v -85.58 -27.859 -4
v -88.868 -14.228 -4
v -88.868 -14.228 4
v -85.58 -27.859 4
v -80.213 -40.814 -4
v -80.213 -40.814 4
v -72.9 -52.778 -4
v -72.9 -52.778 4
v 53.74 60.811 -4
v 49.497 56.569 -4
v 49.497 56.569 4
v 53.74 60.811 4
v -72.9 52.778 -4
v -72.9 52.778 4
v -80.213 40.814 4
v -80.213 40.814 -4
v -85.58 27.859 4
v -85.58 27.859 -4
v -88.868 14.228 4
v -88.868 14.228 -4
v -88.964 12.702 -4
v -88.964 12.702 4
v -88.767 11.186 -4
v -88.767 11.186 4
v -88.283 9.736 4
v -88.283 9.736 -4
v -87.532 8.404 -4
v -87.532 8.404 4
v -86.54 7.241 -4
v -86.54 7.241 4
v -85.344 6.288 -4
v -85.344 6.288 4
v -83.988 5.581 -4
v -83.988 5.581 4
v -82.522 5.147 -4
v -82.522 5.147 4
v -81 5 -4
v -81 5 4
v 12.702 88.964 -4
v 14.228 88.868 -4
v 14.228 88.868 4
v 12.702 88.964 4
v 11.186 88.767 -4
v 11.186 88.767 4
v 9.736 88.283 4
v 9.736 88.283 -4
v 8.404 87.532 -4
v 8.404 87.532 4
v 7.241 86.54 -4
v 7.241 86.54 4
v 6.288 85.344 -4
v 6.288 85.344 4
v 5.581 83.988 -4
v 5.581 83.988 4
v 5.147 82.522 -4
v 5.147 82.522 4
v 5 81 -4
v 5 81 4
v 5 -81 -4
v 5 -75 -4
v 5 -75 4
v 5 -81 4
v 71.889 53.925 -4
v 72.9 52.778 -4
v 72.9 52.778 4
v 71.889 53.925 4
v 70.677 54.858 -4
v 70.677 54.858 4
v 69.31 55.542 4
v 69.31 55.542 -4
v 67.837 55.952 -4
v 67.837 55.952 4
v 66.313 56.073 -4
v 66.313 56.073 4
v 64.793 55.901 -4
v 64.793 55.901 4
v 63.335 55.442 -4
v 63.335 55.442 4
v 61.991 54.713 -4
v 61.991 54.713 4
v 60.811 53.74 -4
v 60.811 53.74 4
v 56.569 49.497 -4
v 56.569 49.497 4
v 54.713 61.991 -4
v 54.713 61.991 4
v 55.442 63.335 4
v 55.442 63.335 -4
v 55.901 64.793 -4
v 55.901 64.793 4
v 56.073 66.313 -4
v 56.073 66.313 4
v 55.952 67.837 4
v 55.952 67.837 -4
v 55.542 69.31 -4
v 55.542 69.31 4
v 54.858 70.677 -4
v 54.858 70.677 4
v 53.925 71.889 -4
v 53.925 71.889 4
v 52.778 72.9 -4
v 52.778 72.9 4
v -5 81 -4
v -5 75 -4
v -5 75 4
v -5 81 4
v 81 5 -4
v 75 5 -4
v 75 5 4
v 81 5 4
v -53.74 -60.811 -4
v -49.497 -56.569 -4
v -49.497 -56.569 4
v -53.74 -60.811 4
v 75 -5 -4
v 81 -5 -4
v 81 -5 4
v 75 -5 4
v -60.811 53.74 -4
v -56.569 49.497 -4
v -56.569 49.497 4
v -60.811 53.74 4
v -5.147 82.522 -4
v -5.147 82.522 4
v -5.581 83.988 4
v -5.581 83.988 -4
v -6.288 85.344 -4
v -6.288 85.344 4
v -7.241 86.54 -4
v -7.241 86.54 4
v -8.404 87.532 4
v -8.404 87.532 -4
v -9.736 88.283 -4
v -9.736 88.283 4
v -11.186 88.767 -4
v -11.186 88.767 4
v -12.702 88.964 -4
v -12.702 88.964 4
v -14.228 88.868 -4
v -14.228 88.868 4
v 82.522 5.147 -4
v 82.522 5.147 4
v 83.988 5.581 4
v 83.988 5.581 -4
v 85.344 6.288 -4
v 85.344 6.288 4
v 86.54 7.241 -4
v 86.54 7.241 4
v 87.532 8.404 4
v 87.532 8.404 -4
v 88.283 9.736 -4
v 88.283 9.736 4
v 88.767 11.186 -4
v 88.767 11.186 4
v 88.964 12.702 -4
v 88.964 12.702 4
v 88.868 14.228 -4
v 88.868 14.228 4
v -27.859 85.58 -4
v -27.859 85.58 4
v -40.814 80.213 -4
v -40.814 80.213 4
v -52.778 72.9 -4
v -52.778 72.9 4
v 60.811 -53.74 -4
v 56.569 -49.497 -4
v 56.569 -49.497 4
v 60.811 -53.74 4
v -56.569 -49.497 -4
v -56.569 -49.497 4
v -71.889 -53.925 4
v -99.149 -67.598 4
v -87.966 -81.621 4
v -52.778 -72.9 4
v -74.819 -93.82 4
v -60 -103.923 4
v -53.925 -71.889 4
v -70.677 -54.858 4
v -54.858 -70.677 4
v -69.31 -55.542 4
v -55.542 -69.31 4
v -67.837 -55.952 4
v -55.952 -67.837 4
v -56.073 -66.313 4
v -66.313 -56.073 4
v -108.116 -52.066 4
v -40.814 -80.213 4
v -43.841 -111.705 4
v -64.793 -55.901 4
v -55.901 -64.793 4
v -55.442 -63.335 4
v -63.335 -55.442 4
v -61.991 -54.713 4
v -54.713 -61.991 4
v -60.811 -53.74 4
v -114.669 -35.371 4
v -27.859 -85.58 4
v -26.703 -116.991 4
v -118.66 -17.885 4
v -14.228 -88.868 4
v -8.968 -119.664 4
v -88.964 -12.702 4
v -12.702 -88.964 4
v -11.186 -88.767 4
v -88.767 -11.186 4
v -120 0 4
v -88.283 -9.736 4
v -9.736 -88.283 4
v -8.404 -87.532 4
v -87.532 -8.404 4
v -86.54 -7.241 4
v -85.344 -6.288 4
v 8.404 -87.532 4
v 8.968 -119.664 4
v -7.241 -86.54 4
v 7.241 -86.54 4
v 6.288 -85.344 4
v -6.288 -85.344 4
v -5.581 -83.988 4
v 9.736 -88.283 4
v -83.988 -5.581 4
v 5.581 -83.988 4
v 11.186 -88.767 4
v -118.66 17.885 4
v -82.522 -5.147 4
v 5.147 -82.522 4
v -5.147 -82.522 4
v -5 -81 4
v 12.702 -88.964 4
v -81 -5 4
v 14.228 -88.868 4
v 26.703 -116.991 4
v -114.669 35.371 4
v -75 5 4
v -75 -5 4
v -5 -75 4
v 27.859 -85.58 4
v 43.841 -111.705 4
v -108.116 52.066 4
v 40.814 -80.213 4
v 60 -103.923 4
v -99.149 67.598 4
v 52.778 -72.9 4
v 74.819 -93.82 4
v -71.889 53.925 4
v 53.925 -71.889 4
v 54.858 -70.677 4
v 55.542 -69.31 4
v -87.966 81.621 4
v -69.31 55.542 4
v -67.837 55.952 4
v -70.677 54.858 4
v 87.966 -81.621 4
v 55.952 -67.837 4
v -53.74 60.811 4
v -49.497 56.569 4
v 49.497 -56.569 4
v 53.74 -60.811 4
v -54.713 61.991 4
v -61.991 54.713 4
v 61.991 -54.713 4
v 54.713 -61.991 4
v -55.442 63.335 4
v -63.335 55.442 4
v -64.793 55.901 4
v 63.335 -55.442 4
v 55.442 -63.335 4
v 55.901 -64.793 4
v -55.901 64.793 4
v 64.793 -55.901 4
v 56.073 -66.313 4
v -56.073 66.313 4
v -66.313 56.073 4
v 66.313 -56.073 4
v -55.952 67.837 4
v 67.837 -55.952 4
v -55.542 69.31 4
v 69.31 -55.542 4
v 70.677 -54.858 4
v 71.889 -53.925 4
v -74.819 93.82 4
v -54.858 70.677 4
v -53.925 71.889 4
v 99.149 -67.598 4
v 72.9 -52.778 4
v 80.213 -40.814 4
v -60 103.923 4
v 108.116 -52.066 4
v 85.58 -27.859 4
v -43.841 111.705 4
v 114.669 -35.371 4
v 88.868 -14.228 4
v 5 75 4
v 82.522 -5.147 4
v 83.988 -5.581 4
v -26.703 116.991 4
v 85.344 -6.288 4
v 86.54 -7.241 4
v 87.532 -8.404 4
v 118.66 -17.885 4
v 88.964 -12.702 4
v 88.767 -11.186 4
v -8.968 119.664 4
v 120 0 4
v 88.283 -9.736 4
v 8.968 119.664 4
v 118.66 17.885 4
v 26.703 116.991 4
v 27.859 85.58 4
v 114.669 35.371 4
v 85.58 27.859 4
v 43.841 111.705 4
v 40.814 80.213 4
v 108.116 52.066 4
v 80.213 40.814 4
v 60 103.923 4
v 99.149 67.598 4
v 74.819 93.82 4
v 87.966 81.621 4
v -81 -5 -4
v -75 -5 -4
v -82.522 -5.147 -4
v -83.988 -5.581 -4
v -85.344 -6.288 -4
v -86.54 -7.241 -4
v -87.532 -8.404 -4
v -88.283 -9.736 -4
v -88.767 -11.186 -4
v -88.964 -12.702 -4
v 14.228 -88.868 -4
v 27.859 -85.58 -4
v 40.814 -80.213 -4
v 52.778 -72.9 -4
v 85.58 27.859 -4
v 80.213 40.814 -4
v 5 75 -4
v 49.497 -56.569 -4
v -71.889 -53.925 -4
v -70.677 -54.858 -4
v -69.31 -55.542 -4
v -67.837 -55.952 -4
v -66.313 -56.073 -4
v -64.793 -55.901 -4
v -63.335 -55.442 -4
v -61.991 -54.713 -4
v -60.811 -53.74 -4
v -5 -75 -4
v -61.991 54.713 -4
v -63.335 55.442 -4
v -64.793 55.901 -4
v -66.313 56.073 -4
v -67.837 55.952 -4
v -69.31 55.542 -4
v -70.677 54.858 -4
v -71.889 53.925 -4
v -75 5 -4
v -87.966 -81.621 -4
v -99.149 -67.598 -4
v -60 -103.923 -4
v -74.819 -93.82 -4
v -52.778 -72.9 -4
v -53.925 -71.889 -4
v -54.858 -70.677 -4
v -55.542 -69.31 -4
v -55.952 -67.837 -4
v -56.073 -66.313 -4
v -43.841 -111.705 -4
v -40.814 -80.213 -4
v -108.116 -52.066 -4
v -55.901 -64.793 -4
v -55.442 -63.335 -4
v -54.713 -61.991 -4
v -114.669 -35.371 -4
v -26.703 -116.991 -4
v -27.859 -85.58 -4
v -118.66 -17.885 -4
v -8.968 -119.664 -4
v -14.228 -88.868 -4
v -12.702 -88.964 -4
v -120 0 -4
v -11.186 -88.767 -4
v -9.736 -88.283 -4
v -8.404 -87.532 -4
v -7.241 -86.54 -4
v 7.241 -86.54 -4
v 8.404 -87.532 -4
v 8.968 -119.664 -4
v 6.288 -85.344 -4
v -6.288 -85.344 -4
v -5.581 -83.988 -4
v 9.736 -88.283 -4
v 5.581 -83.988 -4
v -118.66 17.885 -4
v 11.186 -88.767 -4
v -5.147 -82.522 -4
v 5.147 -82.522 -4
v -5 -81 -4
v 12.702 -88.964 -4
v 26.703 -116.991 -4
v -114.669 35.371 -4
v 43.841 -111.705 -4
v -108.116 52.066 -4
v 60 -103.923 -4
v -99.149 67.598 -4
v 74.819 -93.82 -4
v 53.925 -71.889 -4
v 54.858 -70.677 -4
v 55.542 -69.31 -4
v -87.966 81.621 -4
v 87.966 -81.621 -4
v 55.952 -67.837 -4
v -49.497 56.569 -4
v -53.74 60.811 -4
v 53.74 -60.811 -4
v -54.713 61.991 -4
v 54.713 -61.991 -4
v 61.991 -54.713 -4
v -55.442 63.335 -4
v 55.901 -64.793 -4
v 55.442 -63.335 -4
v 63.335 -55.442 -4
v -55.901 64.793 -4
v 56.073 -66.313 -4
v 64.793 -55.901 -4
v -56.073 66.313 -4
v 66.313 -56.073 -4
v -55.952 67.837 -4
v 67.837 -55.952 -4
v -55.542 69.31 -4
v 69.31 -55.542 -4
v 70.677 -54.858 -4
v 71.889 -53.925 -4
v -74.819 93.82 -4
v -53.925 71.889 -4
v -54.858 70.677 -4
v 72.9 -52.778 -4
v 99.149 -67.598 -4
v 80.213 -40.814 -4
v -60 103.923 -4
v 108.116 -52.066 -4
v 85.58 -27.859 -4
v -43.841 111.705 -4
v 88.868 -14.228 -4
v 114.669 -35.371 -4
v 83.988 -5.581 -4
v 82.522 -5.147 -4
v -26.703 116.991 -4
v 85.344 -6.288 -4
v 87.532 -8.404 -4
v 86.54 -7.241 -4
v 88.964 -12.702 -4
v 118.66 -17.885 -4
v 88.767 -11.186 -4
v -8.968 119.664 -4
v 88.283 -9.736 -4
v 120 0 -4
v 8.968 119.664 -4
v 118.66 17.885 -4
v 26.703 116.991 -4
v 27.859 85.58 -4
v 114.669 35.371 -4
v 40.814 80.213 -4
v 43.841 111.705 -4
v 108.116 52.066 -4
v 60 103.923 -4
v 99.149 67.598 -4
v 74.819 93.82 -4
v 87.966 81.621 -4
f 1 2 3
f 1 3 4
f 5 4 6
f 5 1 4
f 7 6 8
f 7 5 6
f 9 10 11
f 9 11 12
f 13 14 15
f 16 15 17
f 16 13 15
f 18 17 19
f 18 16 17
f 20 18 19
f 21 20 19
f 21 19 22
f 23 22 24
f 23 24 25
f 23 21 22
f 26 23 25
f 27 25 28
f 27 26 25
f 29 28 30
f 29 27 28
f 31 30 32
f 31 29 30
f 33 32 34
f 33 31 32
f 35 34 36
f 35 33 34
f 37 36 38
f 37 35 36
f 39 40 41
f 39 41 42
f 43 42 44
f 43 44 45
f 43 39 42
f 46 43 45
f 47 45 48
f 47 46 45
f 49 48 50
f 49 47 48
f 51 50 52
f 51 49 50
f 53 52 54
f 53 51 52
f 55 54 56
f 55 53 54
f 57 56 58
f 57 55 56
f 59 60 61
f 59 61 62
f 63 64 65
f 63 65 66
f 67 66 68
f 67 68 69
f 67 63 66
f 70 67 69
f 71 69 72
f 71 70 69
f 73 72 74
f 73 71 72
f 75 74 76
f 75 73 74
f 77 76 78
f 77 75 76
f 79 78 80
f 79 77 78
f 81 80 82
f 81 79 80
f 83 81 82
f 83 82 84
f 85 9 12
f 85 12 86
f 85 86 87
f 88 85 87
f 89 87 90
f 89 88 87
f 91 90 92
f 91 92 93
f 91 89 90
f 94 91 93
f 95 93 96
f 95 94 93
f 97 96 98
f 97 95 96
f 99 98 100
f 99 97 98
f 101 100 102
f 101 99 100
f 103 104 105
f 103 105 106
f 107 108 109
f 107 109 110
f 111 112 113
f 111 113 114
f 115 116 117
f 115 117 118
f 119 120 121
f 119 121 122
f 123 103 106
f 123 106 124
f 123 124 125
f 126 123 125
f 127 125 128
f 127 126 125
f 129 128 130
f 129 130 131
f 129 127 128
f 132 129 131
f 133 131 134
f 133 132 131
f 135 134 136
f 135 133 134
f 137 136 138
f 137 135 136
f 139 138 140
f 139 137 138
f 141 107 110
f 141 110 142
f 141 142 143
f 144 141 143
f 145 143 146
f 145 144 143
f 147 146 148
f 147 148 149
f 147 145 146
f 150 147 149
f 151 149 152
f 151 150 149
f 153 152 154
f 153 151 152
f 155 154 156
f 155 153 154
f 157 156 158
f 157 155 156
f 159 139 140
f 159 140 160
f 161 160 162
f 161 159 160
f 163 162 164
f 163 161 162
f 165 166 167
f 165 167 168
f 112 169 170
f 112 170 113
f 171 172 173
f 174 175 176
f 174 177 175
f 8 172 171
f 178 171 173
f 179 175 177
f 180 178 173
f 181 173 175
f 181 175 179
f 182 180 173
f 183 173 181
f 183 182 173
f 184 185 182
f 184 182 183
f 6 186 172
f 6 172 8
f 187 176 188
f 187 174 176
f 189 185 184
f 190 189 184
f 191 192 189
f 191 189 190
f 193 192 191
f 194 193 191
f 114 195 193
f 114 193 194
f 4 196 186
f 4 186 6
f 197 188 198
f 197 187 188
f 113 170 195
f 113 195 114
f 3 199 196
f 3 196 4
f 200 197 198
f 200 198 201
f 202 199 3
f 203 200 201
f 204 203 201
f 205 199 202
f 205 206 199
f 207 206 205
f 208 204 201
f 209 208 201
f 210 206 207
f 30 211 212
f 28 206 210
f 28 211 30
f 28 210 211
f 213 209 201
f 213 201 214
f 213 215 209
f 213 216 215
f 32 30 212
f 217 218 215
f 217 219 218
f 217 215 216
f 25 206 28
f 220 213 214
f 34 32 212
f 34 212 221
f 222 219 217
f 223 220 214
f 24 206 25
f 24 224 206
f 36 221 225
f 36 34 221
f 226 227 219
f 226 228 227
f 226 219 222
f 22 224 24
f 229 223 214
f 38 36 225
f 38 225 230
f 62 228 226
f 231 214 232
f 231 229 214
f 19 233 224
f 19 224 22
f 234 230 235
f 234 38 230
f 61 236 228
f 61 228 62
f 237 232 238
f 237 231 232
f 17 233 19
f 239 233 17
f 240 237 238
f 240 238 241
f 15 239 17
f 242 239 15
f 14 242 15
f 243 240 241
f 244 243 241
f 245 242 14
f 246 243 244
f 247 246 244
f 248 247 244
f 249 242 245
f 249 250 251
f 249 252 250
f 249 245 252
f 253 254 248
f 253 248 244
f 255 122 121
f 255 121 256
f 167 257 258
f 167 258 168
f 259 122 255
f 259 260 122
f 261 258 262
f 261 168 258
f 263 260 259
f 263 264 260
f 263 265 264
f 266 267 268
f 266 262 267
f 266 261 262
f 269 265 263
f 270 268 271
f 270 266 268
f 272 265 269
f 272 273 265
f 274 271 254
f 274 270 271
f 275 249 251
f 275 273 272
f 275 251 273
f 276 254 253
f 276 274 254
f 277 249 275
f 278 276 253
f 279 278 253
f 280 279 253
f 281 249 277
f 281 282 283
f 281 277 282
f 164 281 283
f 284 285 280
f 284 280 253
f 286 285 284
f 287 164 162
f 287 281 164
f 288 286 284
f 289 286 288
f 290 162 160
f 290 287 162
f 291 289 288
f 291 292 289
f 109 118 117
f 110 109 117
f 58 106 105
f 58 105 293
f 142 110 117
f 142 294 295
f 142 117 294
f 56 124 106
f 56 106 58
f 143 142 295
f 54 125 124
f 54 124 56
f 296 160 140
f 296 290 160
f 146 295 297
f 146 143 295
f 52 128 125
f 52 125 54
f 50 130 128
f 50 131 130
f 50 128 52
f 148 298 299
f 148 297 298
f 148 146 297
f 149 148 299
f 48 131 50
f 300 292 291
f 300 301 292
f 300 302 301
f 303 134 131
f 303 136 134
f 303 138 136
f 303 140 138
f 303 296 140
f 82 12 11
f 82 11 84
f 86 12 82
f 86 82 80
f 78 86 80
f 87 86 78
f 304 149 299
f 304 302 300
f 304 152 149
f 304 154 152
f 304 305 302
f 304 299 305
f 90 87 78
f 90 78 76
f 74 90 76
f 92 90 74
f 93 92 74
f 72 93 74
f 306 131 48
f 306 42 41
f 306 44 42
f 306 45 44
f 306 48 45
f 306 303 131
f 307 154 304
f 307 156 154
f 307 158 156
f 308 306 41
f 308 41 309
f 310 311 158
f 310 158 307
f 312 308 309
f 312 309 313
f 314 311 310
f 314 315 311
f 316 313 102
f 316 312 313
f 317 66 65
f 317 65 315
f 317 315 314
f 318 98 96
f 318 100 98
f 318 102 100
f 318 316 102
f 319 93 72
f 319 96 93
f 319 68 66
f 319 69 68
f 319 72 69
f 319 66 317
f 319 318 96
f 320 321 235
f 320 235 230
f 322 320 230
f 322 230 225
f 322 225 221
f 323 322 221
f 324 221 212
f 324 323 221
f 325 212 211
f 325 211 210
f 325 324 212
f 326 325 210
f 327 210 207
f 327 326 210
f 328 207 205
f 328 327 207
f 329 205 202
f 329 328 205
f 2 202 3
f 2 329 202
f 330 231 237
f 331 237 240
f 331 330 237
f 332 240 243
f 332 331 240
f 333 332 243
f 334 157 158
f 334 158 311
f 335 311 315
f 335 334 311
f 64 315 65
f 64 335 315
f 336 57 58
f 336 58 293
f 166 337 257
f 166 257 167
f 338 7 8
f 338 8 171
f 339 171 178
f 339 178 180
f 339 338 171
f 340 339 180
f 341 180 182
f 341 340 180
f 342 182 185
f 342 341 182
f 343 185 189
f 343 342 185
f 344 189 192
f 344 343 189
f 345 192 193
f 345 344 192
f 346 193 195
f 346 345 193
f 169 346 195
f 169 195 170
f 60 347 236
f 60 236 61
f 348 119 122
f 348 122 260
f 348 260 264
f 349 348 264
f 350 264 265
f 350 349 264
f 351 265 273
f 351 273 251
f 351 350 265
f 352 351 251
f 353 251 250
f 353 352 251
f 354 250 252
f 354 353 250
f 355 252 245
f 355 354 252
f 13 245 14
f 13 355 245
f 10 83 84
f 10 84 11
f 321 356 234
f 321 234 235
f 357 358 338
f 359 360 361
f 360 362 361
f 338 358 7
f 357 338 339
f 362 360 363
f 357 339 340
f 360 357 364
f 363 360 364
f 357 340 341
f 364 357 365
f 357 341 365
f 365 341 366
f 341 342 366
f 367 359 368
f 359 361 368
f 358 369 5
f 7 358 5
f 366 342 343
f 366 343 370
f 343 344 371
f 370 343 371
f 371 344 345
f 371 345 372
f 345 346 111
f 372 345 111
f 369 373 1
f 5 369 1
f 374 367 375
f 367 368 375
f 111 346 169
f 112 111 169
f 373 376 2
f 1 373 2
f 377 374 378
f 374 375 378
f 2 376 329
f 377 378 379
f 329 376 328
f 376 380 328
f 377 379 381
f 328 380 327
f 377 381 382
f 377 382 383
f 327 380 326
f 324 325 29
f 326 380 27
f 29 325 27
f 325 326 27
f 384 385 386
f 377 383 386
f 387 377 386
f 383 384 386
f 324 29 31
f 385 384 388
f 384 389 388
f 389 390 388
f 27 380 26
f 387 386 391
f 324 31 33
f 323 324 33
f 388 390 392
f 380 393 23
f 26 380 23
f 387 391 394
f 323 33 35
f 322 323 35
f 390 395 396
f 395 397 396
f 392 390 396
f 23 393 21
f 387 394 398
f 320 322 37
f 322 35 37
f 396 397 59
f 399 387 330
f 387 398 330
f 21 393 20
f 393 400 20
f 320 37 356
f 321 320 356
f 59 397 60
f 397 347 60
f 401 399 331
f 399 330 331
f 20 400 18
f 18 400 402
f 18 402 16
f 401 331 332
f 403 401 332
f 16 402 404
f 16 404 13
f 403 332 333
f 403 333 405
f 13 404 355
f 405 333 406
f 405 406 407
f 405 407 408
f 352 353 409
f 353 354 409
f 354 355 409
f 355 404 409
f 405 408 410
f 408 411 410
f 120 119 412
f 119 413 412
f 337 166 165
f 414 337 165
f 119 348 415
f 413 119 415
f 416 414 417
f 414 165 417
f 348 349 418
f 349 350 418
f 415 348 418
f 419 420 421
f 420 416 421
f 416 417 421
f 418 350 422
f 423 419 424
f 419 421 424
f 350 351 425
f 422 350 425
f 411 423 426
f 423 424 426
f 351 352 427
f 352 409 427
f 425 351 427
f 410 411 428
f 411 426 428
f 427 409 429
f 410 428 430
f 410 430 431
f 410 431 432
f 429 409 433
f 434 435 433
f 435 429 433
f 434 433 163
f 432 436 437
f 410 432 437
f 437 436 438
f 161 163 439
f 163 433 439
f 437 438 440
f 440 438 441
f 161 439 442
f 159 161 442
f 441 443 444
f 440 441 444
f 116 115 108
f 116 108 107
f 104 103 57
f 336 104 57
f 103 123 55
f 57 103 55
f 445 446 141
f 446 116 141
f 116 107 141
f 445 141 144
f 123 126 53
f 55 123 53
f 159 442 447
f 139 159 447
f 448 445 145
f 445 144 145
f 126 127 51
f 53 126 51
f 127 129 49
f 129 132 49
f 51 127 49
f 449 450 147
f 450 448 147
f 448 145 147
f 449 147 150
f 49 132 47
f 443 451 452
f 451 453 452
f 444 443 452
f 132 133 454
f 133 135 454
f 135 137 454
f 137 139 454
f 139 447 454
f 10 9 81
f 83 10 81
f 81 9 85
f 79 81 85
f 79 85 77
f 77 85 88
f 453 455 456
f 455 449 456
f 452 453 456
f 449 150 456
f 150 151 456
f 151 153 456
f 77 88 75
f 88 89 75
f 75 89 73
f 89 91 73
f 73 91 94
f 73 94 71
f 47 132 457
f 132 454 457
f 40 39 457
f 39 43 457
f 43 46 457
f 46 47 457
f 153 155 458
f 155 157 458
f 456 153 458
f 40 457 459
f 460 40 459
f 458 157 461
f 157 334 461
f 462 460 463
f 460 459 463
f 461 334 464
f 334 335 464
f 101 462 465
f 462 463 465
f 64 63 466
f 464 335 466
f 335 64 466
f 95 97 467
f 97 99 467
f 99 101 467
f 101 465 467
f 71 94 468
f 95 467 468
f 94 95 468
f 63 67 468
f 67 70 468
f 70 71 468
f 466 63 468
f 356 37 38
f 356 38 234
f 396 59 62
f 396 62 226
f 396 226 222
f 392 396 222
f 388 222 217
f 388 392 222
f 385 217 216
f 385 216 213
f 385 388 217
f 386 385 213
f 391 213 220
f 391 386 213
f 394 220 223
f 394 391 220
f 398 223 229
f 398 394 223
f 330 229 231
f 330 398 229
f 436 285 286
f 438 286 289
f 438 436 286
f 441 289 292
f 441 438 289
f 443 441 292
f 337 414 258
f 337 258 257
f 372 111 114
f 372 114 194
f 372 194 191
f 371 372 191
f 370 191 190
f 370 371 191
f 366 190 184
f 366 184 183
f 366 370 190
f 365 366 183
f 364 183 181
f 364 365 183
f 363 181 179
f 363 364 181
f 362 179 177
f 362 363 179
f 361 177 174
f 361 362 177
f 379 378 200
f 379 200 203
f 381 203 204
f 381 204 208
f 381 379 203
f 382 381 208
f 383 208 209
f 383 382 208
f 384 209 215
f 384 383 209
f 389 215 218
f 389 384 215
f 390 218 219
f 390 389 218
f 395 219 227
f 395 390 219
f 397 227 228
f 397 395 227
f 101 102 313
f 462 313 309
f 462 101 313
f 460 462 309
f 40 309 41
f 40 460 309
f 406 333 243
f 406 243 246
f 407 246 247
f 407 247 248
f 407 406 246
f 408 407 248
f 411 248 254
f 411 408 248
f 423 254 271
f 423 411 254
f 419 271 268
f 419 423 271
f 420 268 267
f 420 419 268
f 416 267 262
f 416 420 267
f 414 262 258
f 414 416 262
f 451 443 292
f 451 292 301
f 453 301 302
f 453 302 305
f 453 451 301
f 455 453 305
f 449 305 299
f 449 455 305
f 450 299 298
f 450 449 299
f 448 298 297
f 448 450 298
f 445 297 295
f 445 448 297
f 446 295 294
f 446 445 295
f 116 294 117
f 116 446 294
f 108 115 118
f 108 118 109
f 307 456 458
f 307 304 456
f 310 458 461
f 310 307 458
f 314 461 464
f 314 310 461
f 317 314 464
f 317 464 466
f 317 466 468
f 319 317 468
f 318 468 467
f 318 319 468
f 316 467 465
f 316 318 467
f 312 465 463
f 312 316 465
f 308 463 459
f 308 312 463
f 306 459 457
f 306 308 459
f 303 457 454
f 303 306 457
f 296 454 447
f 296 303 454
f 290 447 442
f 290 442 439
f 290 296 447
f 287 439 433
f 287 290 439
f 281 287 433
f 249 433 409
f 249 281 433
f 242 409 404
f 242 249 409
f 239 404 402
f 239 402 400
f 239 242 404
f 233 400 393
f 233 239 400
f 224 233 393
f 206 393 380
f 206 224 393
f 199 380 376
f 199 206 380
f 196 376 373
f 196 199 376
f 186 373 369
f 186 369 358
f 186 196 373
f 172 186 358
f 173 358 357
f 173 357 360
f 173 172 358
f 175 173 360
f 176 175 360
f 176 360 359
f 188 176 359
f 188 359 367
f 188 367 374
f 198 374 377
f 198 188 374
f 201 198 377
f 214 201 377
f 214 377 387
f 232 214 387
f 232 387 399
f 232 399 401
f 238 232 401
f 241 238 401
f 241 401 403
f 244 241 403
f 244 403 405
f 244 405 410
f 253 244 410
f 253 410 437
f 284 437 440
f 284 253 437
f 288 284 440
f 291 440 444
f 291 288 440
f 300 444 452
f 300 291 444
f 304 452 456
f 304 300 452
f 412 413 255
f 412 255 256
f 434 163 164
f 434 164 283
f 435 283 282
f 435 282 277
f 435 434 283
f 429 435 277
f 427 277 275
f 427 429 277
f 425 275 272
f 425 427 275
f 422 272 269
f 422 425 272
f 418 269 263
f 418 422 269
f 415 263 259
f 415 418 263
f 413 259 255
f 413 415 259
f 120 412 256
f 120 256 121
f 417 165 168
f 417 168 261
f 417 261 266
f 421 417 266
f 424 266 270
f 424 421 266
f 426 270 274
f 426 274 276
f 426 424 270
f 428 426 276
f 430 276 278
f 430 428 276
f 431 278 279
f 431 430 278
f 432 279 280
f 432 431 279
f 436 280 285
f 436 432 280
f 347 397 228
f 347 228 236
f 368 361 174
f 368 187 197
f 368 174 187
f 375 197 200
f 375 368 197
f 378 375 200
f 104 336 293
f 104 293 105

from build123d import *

# Parameters (mm, degrees)
SZKIC1_R                    = 120
SZKIC1_R_2                  = 90
DODANIE_WYCI_GNI_CIE1_DEPTH = 4
DODANIE_WYCI_GNI_CIE2_START = -4
DODANIE_WYCI_GNI_CIE2_DEPTH = 8
SZYK_KO_OWY1_COUNT          = 8


with BuildPart() as part:
    # Szkic1 → Dodanie-wyciągnięcie1 (new, symmetric)
    with BuildSketch(Plane.XY):
        Circle(SZKIC1_R)
        Circle(SZKIC1_R_2, mode=Mode.SUBTRACT)
    extrude(amount=DODANIE_WYCI_GNI_CIE1_DEPTH, both=True)

    # Szkic2 → Dodanie-wyciągnięcie2 (add)
    with BuildSketch(Plane.XY.offset(DODANIE_WYCI_GNI_CIE2_START)):
        with BuildLine():
            Line((5, 75), (-5, 75))
            Line((-5, 75), (-5, 81))
            ThreePointArc((-5, 81), (-7.798428028, 87.063572066), (-14.228153471, 88.868215065))
            ThreePointArc((-14.228153471, 88.868215065), (0, 90), (14.228153471, 88.868215065))
            ThreePointArc((14.228153471, 88.868215065), (7.798428028, 87.063572066), (5, 81))
            Line((5, 81), (5, 75))
        make_face()
    dodanie_wyci_gni_cie2 = extrude(amount=DODANIE_WYCI_GNI_CIE2_DEPTH)

    # Szyk kołowy1: Dodanie-wyciągnięcie2 ×8 about axis
    szyk_ko_owy1_axis = Axis((0, 0, 0), (0, 0, 1))
    for i in range(1, SZYK_KO_OWY1_COUNT):
        add(dodanie_wyci_gni_cie2.rotate(szyk_ko_owy1_axis, i * 360 / SZYK_KO_OWY1_COUNT))


solid = part.part
